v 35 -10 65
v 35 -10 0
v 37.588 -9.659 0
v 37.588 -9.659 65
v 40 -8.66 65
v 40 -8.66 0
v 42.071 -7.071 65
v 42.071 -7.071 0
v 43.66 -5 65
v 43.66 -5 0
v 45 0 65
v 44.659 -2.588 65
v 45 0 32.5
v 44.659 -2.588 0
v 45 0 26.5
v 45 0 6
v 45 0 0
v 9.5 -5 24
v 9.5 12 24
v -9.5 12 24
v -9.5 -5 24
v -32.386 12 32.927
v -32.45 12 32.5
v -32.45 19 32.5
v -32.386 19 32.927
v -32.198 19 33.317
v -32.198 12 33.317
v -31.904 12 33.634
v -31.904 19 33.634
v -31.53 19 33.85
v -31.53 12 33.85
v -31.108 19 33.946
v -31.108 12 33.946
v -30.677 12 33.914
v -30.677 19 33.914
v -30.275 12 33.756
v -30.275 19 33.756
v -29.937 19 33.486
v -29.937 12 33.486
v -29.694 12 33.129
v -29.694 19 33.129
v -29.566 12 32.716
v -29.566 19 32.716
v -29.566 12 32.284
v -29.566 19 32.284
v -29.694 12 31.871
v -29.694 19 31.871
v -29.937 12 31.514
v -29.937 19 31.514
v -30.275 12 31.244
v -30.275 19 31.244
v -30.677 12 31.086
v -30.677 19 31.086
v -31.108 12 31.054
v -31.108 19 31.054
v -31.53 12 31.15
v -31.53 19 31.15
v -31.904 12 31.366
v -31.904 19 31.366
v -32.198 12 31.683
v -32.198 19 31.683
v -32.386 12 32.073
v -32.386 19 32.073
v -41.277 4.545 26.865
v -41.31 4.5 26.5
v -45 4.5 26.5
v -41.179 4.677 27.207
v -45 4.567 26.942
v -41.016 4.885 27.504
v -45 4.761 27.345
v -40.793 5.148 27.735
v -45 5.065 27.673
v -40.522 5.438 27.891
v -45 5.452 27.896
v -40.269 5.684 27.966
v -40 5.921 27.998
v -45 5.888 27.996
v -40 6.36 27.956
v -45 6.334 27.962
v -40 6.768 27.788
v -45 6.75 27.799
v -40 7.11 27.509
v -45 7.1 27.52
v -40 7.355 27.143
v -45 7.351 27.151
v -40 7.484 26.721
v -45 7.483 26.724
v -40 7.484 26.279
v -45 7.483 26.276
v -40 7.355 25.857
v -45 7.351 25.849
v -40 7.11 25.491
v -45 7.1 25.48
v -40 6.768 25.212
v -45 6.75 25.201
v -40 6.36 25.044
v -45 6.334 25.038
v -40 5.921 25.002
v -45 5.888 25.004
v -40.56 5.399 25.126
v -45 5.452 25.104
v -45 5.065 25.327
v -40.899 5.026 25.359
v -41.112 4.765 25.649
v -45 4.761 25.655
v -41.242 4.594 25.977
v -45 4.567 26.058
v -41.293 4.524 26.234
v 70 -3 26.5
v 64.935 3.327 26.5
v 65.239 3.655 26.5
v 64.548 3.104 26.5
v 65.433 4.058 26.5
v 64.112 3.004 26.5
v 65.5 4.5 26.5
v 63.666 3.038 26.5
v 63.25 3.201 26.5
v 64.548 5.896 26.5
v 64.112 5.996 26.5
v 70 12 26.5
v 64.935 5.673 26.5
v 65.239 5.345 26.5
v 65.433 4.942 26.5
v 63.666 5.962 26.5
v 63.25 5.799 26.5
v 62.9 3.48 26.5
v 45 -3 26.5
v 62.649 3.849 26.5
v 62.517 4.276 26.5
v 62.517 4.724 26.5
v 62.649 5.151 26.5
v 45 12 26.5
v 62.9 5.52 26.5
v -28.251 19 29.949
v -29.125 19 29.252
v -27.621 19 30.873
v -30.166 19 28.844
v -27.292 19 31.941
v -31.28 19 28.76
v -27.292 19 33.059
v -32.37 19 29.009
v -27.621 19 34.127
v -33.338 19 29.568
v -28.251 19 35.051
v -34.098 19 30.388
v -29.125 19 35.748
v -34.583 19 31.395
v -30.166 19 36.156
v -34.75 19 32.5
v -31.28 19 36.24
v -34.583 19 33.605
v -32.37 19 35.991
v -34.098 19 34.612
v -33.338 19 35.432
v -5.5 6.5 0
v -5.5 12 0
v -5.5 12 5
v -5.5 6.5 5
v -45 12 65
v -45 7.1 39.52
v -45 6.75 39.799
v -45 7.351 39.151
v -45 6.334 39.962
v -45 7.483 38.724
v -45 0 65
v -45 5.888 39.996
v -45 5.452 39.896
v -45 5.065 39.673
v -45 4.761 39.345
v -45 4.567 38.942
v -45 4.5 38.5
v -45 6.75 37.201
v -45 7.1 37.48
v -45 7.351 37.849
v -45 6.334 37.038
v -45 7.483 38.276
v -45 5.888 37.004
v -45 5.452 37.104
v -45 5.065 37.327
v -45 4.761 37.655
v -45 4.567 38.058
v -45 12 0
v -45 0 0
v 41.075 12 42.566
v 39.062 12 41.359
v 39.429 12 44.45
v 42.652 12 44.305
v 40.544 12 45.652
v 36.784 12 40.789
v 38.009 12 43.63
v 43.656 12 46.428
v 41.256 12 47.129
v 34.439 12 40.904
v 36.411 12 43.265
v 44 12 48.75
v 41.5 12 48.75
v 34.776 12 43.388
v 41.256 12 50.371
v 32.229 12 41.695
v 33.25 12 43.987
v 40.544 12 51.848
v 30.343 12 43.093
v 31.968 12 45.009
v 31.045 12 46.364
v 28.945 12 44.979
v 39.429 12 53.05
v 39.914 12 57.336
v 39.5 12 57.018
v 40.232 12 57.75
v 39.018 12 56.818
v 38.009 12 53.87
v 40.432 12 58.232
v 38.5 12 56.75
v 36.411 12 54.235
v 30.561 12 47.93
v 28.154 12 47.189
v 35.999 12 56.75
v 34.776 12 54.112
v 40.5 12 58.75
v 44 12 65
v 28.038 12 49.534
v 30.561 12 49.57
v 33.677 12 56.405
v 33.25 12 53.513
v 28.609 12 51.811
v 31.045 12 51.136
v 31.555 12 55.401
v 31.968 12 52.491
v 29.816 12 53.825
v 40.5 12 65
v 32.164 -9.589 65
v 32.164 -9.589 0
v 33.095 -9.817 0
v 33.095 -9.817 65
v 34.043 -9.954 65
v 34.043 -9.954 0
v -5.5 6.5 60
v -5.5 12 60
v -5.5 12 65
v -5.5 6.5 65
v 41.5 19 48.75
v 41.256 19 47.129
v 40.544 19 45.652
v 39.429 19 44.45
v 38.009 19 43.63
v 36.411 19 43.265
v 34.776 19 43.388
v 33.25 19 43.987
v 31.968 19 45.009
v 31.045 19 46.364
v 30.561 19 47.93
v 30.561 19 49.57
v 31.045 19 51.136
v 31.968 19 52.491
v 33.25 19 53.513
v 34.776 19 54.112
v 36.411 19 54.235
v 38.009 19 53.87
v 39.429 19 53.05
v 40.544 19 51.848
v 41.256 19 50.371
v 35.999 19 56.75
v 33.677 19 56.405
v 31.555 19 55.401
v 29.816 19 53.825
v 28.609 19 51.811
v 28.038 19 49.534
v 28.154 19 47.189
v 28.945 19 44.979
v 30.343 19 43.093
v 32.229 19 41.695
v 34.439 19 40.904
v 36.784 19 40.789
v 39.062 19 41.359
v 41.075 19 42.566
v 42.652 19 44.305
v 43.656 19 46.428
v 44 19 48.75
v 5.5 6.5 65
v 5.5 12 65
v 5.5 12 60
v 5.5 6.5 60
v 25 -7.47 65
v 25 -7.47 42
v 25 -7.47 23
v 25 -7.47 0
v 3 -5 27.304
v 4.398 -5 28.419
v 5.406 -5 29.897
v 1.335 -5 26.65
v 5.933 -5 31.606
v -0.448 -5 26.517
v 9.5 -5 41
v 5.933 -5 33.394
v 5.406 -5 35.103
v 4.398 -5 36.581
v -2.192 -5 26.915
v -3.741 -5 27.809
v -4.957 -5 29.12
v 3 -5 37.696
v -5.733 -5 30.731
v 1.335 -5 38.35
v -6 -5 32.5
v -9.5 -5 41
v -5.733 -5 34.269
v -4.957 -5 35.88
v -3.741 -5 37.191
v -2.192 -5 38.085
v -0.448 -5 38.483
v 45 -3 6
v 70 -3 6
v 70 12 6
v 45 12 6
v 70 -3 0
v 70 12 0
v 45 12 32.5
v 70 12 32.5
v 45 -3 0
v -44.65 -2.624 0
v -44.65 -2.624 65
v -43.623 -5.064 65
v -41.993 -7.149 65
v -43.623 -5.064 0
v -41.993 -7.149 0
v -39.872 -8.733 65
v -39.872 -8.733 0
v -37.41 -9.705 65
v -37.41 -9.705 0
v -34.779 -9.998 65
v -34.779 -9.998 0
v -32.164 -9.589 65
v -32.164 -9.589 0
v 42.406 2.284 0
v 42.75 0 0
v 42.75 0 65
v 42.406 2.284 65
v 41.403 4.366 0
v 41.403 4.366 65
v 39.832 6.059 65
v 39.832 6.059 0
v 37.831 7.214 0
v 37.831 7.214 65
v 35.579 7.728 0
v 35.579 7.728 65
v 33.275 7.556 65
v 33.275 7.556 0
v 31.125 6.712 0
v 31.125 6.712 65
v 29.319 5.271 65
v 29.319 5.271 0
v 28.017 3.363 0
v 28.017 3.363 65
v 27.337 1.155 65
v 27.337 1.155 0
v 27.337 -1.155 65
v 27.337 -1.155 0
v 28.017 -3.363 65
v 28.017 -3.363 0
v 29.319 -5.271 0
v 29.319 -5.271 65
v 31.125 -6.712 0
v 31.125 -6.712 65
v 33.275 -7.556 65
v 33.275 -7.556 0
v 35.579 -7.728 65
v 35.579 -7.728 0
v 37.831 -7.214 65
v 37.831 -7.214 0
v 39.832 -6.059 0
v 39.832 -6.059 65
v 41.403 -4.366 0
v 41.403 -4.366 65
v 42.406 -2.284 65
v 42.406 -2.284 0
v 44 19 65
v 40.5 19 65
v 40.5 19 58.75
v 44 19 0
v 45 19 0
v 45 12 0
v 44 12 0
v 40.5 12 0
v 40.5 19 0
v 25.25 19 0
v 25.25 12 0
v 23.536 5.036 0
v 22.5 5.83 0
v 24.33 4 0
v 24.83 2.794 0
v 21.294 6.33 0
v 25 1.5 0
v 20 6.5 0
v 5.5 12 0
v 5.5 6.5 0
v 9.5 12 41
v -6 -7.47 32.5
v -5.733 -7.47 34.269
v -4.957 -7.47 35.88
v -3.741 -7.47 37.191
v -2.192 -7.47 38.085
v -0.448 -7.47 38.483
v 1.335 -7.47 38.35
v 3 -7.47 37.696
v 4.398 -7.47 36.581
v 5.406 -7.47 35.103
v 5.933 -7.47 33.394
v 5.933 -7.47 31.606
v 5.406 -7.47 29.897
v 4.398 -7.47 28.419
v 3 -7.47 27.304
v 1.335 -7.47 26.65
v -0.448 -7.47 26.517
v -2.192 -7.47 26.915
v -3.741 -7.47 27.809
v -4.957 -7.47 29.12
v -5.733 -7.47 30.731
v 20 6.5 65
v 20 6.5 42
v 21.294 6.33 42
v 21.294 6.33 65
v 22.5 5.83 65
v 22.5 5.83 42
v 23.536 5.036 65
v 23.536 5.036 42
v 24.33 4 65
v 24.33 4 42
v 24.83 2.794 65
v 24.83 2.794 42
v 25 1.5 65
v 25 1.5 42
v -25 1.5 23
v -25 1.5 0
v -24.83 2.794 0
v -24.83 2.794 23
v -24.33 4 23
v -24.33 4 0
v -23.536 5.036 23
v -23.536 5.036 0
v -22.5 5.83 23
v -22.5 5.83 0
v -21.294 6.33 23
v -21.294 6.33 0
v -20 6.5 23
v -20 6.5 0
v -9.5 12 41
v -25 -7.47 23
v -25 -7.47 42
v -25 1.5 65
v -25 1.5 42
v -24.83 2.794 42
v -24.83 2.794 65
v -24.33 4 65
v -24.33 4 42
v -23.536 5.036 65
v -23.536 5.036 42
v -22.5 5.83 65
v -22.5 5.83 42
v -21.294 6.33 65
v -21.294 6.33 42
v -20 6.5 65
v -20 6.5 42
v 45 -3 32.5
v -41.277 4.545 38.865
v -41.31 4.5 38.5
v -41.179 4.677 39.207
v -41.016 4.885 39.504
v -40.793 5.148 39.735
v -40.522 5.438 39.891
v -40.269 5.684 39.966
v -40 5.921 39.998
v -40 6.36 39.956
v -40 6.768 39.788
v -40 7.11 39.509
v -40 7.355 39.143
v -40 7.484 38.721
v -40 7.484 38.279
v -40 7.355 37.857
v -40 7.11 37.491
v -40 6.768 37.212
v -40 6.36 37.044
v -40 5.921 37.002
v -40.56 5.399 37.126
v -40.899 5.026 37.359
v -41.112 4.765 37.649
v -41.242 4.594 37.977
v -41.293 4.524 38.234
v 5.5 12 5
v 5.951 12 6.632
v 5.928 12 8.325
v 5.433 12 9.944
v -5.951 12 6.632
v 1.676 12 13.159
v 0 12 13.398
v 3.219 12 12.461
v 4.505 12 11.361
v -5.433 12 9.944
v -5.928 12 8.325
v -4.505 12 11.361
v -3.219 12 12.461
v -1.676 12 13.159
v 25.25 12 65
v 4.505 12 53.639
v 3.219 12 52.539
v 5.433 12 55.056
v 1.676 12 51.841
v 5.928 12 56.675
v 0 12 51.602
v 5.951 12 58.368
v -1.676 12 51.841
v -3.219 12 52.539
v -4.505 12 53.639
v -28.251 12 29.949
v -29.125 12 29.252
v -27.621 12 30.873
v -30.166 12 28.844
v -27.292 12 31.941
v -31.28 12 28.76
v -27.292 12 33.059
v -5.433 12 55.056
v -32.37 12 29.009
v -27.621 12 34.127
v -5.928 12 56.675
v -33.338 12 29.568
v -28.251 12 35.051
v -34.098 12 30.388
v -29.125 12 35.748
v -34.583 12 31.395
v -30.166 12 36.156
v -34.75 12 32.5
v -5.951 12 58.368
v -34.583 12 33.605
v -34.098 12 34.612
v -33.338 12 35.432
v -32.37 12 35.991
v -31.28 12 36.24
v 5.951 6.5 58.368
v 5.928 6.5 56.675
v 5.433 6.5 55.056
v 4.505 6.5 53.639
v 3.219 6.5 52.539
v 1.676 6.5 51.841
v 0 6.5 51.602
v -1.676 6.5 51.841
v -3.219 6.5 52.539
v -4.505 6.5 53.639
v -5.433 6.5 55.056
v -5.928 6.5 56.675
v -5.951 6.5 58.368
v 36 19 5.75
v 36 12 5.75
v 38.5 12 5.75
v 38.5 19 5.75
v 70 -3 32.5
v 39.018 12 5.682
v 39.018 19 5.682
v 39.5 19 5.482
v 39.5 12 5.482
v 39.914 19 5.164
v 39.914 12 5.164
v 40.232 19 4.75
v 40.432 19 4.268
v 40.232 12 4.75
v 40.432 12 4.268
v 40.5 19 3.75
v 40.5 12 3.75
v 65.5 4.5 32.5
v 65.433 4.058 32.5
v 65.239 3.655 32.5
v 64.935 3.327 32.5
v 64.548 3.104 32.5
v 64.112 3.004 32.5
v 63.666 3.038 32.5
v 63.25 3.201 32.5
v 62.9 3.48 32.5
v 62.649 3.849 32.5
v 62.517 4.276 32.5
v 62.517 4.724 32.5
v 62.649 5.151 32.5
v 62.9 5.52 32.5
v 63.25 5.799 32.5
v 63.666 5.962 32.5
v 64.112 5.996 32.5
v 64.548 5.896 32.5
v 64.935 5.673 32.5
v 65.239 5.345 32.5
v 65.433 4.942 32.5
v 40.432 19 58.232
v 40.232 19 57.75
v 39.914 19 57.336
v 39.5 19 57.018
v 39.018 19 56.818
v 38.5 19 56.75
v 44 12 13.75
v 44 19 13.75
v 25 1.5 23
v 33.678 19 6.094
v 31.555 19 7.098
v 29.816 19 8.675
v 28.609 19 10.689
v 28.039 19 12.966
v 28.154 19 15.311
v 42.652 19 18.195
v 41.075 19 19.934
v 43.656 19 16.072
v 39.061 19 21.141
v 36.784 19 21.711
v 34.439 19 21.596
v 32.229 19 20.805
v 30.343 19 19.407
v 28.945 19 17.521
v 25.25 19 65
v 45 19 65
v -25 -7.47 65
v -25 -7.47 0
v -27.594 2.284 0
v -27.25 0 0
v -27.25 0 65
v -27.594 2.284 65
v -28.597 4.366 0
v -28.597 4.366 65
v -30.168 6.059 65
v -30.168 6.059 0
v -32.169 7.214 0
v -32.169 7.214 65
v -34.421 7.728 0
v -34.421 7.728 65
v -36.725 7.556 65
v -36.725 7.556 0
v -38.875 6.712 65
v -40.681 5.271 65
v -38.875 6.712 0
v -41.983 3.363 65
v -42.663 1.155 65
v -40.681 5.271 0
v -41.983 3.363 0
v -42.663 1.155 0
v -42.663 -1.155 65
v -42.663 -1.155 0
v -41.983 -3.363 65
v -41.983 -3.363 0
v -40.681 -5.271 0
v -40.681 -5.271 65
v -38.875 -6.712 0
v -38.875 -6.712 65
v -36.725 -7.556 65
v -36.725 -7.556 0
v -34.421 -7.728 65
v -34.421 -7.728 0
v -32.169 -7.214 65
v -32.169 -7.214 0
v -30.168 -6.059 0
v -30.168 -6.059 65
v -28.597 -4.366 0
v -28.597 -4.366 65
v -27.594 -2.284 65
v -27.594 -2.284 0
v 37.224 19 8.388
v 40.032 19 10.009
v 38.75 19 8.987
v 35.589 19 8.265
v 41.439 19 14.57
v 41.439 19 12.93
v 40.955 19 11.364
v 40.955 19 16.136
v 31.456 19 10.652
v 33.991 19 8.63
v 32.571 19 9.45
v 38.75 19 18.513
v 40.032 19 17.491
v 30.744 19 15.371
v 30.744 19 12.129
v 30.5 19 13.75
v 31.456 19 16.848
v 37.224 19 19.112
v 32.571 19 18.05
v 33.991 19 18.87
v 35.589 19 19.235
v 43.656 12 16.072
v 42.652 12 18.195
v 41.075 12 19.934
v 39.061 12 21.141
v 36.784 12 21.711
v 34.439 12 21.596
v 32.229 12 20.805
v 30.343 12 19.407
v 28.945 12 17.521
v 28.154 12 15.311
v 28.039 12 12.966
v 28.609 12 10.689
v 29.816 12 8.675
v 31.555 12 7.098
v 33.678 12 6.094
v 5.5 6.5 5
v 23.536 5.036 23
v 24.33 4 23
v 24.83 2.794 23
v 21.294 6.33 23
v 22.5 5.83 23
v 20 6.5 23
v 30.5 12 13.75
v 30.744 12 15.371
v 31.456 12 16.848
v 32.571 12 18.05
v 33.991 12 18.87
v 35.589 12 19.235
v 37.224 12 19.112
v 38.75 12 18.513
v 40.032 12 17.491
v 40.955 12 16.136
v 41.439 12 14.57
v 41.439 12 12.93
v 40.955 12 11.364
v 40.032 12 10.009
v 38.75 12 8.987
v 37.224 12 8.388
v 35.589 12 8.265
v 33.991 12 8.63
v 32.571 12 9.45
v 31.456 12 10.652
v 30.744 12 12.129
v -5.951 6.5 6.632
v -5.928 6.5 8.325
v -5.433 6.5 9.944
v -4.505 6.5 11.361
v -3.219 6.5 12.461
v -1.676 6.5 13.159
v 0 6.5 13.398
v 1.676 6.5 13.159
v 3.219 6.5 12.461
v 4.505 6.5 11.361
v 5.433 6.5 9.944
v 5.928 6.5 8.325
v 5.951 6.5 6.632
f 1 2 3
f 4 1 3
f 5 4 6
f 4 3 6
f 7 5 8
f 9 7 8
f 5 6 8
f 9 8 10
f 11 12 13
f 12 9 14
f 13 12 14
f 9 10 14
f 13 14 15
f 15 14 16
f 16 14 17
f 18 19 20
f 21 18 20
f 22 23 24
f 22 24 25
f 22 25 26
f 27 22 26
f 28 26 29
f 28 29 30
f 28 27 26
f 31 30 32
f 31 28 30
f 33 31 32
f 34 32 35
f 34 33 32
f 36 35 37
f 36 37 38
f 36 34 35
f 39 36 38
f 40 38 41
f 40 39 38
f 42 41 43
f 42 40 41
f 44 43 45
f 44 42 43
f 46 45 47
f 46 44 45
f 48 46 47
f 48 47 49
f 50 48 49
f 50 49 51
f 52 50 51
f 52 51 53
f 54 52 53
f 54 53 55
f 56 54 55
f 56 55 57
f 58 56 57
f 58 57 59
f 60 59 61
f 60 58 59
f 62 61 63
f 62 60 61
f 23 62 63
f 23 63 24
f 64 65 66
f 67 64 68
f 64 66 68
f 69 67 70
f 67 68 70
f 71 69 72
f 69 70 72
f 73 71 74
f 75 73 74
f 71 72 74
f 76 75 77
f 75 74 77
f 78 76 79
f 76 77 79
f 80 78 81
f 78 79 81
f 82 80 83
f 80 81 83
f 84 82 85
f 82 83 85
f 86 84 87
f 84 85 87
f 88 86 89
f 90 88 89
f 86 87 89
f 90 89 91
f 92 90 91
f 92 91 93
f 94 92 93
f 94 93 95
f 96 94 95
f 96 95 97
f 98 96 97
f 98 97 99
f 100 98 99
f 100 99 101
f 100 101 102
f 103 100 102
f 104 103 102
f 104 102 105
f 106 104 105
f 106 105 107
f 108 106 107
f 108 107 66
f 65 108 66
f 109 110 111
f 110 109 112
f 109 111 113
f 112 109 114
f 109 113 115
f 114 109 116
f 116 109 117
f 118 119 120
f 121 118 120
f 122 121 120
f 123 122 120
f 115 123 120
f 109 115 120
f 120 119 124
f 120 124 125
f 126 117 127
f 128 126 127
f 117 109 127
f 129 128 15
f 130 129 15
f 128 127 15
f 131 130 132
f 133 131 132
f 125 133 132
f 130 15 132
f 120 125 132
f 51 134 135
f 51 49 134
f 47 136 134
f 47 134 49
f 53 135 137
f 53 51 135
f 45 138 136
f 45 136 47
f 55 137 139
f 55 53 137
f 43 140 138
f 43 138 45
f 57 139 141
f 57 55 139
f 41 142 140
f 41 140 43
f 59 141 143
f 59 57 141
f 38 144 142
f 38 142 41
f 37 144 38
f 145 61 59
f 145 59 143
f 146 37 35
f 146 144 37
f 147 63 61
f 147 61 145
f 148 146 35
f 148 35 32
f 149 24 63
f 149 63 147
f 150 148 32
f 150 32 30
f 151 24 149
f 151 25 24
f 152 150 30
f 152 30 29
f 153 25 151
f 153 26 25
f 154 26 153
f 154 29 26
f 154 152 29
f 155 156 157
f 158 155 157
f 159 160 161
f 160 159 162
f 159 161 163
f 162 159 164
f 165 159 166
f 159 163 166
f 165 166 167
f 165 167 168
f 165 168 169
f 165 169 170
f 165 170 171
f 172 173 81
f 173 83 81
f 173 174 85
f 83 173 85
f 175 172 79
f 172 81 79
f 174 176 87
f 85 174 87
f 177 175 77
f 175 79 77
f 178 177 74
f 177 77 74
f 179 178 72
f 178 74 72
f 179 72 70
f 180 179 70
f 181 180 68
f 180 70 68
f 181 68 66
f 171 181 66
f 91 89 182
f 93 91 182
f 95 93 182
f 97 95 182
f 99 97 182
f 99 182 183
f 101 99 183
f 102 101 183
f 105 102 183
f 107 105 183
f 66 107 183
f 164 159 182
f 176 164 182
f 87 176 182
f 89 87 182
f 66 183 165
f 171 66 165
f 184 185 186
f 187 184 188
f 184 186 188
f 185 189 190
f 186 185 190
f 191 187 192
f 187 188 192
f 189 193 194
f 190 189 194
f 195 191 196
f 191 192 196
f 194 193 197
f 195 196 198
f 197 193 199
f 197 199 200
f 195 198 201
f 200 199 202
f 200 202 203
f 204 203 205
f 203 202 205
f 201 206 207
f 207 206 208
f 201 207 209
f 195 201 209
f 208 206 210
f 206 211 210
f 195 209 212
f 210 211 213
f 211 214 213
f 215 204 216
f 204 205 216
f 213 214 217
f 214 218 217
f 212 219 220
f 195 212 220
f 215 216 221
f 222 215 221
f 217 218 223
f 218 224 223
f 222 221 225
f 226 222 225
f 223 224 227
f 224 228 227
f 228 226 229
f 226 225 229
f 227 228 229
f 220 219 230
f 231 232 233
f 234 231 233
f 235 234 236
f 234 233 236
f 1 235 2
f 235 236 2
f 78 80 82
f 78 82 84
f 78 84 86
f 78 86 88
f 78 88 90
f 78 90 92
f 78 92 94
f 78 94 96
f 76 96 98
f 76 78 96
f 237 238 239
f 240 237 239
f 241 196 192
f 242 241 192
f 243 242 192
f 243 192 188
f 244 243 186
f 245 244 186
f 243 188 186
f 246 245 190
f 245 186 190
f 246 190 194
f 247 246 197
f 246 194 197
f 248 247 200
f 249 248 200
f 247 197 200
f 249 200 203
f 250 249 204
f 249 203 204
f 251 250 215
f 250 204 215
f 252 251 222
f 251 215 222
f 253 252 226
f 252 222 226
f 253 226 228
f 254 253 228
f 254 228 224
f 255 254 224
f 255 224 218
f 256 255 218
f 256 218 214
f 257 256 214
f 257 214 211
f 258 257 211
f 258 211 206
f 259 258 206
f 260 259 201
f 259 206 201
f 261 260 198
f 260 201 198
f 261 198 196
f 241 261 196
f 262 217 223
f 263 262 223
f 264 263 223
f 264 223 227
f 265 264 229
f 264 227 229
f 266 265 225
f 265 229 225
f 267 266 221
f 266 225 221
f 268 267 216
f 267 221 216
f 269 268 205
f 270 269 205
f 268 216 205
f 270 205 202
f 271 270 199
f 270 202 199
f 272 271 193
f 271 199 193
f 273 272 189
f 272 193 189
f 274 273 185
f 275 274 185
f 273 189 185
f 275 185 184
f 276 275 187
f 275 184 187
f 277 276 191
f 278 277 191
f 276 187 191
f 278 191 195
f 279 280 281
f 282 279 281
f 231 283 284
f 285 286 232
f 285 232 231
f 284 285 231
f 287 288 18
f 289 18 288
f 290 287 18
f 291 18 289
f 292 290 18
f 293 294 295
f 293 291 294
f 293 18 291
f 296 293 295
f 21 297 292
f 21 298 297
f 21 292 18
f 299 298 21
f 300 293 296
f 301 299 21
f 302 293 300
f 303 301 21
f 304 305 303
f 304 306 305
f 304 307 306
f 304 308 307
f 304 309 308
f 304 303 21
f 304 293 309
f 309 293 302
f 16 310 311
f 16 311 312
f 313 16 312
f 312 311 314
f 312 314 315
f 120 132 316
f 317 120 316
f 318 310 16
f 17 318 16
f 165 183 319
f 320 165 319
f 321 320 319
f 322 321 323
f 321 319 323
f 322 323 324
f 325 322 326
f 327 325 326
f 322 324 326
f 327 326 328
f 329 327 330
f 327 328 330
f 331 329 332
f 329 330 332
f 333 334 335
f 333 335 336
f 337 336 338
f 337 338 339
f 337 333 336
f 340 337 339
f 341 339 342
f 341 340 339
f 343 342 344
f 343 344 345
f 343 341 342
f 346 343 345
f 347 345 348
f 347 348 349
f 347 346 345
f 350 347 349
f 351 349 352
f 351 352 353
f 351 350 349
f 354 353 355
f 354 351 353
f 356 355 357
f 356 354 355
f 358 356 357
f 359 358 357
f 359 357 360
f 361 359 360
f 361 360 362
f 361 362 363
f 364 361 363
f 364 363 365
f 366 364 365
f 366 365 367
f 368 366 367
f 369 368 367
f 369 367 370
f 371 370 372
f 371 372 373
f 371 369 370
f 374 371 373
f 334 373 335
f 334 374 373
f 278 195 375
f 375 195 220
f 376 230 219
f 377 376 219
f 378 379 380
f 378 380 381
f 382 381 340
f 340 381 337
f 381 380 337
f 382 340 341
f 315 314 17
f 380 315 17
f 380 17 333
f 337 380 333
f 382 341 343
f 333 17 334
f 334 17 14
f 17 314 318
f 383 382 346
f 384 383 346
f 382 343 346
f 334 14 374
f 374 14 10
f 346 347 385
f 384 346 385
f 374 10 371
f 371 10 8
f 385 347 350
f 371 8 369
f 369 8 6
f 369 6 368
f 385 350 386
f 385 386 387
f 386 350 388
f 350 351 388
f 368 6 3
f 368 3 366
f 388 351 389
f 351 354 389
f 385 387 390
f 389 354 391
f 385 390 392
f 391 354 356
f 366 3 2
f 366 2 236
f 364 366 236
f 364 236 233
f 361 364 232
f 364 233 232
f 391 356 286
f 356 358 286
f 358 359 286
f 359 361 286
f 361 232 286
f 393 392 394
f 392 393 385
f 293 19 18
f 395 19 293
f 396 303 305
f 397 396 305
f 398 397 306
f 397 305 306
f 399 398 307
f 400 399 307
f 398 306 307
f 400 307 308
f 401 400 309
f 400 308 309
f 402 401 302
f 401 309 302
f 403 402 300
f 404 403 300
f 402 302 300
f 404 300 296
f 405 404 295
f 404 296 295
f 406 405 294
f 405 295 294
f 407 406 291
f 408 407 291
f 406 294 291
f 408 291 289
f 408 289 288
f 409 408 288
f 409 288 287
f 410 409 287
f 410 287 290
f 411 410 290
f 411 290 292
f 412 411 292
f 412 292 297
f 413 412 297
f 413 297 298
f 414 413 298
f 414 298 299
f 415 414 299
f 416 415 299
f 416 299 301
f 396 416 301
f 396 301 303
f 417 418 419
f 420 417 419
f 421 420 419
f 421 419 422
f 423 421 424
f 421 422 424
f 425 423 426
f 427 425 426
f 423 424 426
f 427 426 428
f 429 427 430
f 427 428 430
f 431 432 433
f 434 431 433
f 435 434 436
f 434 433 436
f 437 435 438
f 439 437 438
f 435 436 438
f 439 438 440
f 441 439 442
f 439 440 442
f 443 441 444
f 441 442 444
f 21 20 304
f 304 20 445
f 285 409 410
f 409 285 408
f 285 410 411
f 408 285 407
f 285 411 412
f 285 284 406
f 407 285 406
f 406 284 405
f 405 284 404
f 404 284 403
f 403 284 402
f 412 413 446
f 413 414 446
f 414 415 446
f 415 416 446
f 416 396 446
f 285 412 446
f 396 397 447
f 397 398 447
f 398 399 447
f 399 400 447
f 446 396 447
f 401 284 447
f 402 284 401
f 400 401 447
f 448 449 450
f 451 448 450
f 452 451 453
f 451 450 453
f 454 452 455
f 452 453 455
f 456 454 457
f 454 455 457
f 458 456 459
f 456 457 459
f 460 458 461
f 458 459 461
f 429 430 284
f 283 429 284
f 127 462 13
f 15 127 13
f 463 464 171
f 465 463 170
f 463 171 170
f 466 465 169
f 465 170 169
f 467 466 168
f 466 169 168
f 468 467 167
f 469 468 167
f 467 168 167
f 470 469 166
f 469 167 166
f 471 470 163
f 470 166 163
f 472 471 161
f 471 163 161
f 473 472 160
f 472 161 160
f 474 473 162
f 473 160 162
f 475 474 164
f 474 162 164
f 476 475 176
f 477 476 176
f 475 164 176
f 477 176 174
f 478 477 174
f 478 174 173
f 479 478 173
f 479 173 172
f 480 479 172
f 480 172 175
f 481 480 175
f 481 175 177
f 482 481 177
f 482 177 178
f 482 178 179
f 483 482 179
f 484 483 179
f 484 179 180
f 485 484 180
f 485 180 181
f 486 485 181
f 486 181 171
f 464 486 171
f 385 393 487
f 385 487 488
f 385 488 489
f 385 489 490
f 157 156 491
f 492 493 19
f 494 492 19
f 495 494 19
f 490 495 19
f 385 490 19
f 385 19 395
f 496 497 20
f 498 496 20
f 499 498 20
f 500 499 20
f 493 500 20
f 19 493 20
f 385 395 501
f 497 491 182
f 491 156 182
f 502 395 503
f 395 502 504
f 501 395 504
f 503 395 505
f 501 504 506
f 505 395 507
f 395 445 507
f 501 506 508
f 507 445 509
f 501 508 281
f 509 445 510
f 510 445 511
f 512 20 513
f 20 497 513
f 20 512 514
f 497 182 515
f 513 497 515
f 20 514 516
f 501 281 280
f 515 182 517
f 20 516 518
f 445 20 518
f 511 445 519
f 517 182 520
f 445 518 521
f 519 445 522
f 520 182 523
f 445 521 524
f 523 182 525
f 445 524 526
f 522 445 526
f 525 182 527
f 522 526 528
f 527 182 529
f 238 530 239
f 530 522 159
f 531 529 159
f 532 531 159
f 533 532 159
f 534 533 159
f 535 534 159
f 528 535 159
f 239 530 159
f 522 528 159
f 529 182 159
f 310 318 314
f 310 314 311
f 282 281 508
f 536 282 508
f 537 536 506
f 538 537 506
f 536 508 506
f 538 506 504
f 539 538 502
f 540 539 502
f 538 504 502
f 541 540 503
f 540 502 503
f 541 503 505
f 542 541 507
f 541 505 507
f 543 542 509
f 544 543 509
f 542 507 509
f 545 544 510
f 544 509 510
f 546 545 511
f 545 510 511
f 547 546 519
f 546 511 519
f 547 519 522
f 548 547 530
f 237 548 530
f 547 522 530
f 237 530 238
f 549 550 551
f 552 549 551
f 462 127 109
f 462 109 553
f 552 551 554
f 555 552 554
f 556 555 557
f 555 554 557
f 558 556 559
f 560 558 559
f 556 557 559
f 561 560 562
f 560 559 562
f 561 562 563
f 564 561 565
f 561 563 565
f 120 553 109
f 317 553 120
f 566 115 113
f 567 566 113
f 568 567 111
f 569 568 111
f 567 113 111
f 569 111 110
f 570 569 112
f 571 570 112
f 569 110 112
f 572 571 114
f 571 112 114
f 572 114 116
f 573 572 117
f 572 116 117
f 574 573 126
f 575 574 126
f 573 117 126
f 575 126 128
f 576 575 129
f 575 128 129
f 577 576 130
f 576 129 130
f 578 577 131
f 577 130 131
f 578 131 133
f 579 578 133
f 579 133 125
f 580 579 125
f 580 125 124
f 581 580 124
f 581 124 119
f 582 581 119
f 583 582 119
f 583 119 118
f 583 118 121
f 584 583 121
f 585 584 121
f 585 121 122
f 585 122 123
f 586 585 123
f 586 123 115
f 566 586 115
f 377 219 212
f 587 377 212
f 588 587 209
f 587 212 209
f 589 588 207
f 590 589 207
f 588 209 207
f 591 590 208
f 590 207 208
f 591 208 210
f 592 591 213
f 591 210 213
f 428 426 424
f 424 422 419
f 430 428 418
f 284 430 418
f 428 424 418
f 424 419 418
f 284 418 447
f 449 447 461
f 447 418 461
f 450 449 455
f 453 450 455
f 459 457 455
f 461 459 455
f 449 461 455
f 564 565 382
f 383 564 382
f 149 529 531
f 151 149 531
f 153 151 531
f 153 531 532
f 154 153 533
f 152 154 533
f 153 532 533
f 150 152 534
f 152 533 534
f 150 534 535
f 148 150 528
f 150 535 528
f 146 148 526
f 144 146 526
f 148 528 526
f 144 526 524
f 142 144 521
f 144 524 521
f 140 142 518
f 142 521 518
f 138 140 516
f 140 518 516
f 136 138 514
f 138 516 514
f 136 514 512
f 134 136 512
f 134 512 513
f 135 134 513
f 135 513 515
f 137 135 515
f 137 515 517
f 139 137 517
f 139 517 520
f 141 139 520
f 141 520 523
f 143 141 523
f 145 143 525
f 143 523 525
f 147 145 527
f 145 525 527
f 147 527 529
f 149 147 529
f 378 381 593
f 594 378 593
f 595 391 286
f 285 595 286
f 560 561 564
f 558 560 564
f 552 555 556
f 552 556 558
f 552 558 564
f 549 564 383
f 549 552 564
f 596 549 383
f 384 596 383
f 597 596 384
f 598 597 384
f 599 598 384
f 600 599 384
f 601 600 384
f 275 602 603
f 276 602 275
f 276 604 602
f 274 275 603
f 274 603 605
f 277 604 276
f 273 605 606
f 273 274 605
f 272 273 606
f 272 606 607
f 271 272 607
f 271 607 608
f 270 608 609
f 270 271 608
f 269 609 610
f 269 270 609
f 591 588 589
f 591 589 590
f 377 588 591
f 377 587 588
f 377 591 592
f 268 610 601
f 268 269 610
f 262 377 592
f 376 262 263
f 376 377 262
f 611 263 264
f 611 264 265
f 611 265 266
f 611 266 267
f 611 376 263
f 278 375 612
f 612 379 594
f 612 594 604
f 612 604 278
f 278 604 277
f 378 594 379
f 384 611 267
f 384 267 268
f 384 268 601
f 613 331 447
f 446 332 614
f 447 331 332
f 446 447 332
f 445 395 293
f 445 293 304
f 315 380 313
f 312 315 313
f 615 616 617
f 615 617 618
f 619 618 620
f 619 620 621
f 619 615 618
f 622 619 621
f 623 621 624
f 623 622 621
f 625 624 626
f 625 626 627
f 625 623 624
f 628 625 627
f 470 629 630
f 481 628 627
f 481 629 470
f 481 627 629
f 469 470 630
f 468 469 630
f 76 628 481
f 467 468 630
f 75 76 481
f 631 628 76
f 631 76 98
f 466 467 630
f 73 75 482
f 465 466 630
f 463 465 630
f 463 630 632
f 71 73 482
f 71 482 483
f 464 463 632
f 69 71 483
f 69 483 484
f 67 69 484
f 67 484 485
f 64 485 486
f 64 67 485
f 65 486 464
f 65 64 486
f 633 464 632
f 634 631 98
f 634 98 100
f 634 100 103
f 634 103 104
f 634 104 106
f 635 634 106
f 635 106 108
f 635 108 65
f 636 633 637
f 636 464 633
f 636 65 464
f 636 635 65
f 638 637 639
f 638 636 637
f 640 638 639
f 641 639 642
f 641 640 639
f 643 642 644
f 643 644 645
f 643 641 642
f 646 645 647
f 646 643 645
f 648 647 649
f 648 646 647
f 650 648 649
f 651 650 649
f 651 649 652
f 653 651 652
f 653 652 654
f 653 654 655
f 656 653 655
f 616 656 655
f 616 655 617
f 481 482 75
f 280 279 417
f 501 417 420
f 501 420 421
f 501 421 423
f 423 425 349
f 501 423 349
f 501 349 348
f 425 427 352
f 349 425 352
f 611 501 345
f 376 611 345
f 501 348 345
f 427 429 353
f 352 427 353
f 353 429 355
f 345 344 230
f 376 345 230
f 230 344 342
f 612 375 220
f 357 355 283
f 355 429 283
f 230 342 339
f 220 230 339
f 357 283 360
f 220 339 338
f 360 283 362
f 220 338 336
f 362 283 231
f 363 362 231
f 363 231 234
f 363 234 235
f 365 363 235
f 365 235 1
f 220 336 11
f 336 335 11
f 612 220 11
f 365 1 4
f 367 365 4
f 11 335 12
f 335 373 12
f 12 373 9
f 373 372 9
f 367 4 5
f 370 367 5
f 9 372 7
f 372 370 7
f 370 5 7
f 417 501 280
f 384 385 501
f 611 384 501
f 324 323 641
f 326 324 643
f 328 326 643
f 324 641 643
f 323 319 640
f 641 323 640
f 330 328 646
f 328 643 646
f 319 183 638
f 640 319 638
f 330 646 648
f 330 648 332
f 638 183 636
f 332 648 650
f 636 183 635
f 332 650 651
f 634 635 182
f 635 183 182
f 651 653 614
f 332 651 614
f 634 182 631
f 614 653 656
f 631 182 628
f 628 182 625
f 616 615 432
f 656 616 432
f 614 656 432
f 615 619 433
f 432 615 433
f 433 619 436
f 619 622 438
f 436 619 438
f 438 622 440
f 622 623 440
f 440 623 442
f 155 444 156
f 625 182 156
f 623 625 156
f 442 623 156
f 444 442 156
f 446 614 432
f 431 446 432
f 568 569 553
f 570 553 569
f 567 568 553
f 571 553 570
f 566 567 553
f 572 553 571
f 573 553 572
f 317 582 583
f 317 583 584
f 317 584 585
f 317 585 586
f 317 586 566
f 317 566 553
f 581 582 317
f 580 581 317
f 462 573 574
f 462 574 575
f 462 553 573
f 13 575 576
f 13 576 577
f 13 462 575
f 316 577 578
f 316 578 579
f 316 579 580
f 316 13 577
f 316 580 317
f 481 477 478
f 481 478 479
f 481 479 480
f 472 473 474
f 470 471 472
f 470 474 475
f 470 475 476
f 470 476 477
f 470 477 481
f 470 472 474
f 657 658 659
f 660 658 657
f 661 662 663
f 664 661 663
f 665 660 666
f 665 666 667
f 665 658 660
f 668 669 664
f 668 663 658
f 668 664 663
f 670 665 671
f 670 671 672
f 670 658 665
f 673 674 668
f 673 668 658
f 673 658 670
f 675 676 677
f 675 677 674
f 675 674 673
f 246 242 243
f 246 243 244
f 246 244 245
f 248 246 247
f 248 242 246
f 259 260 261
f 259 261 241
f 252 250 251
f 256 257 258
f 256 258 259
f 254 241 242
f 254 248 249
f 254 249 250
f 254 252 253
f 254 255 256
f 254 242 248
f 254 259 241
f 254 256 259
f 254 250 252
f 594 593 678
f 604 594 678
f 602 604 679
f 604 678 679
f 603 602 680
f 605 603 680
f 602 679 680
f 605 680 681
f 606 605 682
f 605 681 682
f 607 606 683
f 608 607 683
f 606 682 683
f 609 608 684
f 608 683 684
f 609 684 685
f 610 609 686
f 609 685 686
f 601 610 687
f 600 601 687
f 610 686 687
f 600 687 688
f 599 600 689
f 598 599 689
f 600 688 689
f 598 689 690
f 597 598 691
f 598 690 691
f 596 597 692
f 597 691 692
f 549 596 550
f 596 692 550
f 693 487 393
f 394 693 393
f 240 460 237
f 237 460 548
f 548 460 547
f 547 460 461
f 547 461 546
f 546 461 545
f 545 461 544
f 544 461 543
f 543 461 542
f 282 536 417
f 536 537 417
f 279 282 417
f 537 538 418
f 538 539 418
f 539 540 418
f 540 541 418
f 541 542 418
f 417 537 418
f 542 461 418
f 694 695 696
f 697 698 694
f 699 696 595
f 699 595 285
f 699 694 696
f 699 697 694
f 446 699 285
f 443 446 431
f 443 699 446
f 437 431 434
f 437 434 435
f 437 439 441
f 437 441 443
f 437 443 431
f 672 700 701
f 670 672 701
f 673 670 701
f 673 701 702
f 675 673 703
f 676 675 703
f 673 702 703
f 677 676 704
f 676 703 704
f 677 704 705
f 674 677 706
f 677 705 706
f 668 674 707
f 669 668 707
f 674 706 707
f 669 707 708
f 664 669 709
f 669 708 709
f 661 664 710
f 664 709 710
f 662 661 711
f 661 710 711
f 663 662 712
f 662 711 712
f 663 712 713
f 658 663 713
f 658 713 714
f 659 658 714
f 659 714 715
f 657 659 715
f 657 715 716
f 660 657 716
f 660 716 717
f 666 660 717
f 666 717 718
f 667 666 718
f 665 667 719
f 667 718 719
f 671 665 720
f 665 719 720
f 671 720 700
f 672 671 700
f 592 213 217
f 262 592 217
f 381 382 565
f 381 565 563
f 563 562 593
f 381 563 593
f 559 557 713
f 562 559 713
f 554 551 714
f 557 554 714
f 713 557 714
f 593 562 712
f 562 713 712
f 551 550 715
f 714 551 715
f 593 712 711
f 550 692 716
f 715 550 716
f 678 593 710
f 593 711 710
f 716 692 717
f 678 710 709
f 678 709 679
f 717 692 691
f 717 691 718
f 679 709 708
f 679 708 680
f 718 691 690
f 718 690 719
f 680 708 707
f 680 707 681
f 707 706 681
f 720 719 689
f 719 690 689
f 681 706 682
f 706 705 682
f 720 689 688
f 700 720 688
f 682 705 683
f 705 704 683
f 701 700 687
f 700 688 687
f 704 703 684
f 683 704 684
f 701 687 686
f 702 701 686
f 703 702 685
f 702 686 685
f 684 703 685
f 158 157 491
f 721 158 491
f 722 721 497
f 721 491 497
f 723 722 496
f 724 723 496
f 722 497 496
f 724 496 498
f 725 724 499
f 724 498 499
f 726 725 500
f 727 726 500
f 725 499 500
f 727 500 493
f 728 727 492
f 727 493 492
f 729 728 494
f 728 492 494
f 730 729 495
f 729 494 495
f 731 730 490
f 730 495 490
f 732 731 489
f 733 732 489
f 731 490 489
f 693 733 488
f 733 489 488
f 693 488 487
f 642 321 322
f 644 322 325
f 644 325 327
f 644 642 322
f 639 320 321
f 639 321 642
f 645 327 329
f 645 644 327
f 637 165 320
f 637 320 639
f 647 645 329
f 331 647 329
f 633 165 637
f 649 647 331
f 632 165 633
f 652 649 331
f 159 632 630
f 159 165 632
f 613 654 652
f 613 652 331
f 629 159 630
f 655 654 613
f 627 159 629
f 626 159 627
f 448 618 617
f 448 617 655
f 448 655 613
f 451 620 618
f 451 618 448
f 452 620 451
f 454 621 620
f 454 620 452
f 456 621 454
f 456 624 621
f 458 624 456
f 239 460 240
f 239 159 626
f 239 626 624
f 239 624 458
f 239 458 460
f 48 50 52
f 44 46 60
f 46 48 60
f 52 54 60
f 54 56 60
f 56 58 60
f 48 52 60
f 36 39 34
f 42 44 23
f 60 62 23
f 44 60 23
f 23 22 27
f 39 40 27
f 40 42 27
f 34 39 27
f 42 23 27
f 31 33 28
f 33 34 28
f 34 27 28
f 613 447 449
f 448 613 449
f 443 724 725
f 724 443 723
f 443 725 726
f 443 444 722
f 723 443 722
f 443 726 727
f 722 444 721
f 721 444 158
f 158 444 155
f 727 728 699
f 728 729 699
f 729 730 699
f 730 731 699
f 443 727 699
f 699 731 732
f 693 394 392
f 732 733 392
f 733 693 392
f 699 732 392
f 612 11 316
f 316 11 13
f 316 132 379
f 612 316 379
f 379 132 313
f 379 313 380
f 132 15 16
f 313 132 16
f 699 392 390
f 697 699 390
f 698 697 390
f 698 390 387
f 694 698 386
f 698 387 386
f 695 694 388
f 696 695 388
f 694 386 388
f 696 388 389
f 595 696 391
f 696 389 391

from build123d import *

# Parameters (mm, degrees)
F0_R      = 7.75
F1_DEPTH  = 65
F2_R      = 6
F3_DEPTH  = 25
F4_W      = 15
F4_H      = 6
F5_DEPTH  = 25
F6_R      = 1.5
F7_DEPTH  = 25
F8_R      = 3.75
F8_R_2    = 1.45
F8_R_3    = 5.5
F9_DEPTH  = 7
F10_R     = 1.5
F11_DEPTH = 5
F2_W      = 53
F2_H      = 19
F2_W_2    = 19
F2_H_2    = 17
F12_DEPTH = 19.47049
F13_DEPTH = 17


with BuildPart() as f1:
    # F0 (on Top) → F1 (new body)
    with BuildSketch(Plane.XY):
        with BuildLine():
            Line((25, -7.470489), (32.163705, -9.589339))
            ThreePointArc((32.163705, -9.589339), (33.567065, -9.896802), (35, -10))
            ThreePointArc((35, -10), (42.071068, -7.071068), (45, 0))
            Line((45, 0), (45, 12))
            Line((45, 12), (0, 12))
            Line((0, 12), (-45, 12))
            Line((-45, 12), (-45, 0))
            ThreePointArc((-45, 0), (-40.984858, -8.011334), (-32.163705, -9.589339))
            Line((-32.163705, -9.589339), (-25, -7.470489))
            Line((-25, -7.470489), (-25, 0))
            Line((-25, 0), (-25, 1.5))
            ThreePointArc((-25, 1.5), (-23.535534, 5.035534), (-20, 6.5))
            Line((-20, 6.5), (20, 6.5))
            ThreePointArc((20, 6.5), (23.535534, 5.035534), (25, 1.5))
            Line((25, 1.5), (25, 0))
            Line((25, 0), (25, -7.470489))
        make_face()
        with Locations((-35, 0)):
            Circle(F0_R, mode=Mode.SUBTRACT)
        with Locations((35, 0)):
            Circle(F0_R, mode=Mode.SUBTRACT)
    extrude(amount=F1_DEPTH)

    # F2 (on face) → F3 (cut)
    with BuildSketch(Plane(origin=(0, 12, 0), x_dir=(-1, 0, 0), z_dir=(0, 1, 0))):
        with BuildLine():
            Line((-5.5, 65), (-5.5, 60))
            ThreePointArc((-5.5, 60), (0, 51.602084), (5.5, 60))
            Line((5.5, 60), (5.5, 65))
            Line((5.5, 65), (-5.5, 65))
        make_face()
        with Locations((0, 32.5)):
            Circle(F2_R)
        with BuildLine():
            Line((-5.5, 5), (-5.5, 0))
            Line((-5.5, 0), (5.5, 0))
            Line((5.5, 0), (5.5, 5))
            ThreePointArc((5.5, 5), (0, 13.397916), (-5.5, 5))
        make_face()
    extrude(amount=-F3_DEPTH, mode=Mode.SUBTRACT)

    # F4 (on face) → F5 (join)
    with BuildSketch(Plane.YZ.offset(45)):
        with Locations((4.5, 29.5)):
            Rectangle(F4_W, F4_H)
        with Locations((4.5, 3)):
            Rectangle(F4_W, F4_H)
    extrude(amount=F5_DEPTH)

    # F6 (on face) → F7 (cut)
    with BuildSketch(Plane(origin=(0, 0, 26.5), x_dir=(1, 0, 0), z_dir=(0, 0, -1))):
        with Locations((64, -4.5)):
            Circle(F6_R)
    extrude(amount=-F7_DEPTH, mode=Mode.SUBTRACT)

    # F8 (on face) → F9 (join)
    with BuildSketch(Plane(origin=(0, 12, 0), x_dir=(-1, 0, 0), z_dir=(0, 1, 0))):
        with Locations((31, 32.5)):
            Circle(F8_R)
        with Locations((31, 32.5)):
            Circle(F8_R_2, mode=Mode.SUBTRACT)
        with BuildLine():
            ThreePointArc((-35.999405, 56.75), (-30.343356, 43.092935), (-44, 48.75))
            Line((-44, 48.75), (-44, 13.75))
            ThreePointArc((-44, 13.75), (-30.343146, 19.406854), (-36, 5.75))
            Line((-36, 5.75), (-38.5, 5.75))
            ThreePointArc((-38.5, 5.75), (-39.914214, 5.164214), (-40.5, 3.75))
            Line((-40.5, 3.75), (-40.5, 0))
            Line((-40.5, 0), (-25.25, 0))
            Line((-25.25, 0), (-25.25, 65))
            Line((-25.25, 65), (-40.5, 65))
            Line((-40.5, 65), (-40.5, 58.750074))
            ThreePointArc((-40.5, 58.750074), (-39.914235, 57.335882), (-38.50006, 56.750074))
            Line((-38.50006, 56.750074), (-35.999405, 56.75))
        make_face()
        Polygon((-44, 65), (-45, 65), (-45, 32.5), (-45, 26.5), (-45, 6), (-45, 0), (-44, 0), (-44, 13.75), (-44, 48.75), align=None)
        with Locations((-36, 13.75)):
            Circle(F8_R_3)
        with BuildLine():
            ThreePointArc((-30.5, 48.75), (-36, 54.25), (-41.5, 48.75))
            ThreePointArc((-41.5, 48.75), (-36, 43.25), (-30.5, 48.75))
        make_face()
    extrude(amount=F9_DEPTH)

    # F10 (on face) → F11 (cut)
    with BuildSketch(Plane(origin=(-45, 0, 0), x_dir=(0, -1, 0), z_dir=(-1, 0, 0))):
        with Locations((-6, 26.5)):
            Circle(F10_R)
        with Locations((-6, 38.5)):
            Circle(F10_R)
    extrude(amount=-F11_DEPTH, mode=Mode.SUBTRACT)

    # F2 (on face) → F12 (join)
    with BuildSketch(Plane(origin=(0, 12, 0), x_dir=(-1, 0, 0), z_dir=(0, 1, 0))):
        with Locations((0, 32.5)):
            Rectangle(F2_W, F2_H)
        with Locations((0, 32.5)):
            Rectangle(F2_W_2, F2_H_2, mode=Mode.SUBTRACT)
        with Locations((0, 32.5)):
            Rectangle(F2_W_2, F2_H_2)
        with Locations((0, 32.5)):
            Circle(F2_R, mode=Mode.SUBTRACT)
    extrude(amount=-F12_DEPTH)

    # F2 (on face) → F13 (cut)
    with BuildSketch(Plane(origin=(0, 12, 0), x_dir=(-1, 0, 0), z_dir=(0, 1, 0))):
        with Locations((0, 32.5)):
            Rectangle(F2_W_2, F2_H_2)
        with Locations((0, 32.5)):
            Circle(F2_R, mode=Mode.SUBTRACT)
    extrude(amount=-F13_DEPTH, mode=Mode.SUBTRACT)


solid = f1.part
